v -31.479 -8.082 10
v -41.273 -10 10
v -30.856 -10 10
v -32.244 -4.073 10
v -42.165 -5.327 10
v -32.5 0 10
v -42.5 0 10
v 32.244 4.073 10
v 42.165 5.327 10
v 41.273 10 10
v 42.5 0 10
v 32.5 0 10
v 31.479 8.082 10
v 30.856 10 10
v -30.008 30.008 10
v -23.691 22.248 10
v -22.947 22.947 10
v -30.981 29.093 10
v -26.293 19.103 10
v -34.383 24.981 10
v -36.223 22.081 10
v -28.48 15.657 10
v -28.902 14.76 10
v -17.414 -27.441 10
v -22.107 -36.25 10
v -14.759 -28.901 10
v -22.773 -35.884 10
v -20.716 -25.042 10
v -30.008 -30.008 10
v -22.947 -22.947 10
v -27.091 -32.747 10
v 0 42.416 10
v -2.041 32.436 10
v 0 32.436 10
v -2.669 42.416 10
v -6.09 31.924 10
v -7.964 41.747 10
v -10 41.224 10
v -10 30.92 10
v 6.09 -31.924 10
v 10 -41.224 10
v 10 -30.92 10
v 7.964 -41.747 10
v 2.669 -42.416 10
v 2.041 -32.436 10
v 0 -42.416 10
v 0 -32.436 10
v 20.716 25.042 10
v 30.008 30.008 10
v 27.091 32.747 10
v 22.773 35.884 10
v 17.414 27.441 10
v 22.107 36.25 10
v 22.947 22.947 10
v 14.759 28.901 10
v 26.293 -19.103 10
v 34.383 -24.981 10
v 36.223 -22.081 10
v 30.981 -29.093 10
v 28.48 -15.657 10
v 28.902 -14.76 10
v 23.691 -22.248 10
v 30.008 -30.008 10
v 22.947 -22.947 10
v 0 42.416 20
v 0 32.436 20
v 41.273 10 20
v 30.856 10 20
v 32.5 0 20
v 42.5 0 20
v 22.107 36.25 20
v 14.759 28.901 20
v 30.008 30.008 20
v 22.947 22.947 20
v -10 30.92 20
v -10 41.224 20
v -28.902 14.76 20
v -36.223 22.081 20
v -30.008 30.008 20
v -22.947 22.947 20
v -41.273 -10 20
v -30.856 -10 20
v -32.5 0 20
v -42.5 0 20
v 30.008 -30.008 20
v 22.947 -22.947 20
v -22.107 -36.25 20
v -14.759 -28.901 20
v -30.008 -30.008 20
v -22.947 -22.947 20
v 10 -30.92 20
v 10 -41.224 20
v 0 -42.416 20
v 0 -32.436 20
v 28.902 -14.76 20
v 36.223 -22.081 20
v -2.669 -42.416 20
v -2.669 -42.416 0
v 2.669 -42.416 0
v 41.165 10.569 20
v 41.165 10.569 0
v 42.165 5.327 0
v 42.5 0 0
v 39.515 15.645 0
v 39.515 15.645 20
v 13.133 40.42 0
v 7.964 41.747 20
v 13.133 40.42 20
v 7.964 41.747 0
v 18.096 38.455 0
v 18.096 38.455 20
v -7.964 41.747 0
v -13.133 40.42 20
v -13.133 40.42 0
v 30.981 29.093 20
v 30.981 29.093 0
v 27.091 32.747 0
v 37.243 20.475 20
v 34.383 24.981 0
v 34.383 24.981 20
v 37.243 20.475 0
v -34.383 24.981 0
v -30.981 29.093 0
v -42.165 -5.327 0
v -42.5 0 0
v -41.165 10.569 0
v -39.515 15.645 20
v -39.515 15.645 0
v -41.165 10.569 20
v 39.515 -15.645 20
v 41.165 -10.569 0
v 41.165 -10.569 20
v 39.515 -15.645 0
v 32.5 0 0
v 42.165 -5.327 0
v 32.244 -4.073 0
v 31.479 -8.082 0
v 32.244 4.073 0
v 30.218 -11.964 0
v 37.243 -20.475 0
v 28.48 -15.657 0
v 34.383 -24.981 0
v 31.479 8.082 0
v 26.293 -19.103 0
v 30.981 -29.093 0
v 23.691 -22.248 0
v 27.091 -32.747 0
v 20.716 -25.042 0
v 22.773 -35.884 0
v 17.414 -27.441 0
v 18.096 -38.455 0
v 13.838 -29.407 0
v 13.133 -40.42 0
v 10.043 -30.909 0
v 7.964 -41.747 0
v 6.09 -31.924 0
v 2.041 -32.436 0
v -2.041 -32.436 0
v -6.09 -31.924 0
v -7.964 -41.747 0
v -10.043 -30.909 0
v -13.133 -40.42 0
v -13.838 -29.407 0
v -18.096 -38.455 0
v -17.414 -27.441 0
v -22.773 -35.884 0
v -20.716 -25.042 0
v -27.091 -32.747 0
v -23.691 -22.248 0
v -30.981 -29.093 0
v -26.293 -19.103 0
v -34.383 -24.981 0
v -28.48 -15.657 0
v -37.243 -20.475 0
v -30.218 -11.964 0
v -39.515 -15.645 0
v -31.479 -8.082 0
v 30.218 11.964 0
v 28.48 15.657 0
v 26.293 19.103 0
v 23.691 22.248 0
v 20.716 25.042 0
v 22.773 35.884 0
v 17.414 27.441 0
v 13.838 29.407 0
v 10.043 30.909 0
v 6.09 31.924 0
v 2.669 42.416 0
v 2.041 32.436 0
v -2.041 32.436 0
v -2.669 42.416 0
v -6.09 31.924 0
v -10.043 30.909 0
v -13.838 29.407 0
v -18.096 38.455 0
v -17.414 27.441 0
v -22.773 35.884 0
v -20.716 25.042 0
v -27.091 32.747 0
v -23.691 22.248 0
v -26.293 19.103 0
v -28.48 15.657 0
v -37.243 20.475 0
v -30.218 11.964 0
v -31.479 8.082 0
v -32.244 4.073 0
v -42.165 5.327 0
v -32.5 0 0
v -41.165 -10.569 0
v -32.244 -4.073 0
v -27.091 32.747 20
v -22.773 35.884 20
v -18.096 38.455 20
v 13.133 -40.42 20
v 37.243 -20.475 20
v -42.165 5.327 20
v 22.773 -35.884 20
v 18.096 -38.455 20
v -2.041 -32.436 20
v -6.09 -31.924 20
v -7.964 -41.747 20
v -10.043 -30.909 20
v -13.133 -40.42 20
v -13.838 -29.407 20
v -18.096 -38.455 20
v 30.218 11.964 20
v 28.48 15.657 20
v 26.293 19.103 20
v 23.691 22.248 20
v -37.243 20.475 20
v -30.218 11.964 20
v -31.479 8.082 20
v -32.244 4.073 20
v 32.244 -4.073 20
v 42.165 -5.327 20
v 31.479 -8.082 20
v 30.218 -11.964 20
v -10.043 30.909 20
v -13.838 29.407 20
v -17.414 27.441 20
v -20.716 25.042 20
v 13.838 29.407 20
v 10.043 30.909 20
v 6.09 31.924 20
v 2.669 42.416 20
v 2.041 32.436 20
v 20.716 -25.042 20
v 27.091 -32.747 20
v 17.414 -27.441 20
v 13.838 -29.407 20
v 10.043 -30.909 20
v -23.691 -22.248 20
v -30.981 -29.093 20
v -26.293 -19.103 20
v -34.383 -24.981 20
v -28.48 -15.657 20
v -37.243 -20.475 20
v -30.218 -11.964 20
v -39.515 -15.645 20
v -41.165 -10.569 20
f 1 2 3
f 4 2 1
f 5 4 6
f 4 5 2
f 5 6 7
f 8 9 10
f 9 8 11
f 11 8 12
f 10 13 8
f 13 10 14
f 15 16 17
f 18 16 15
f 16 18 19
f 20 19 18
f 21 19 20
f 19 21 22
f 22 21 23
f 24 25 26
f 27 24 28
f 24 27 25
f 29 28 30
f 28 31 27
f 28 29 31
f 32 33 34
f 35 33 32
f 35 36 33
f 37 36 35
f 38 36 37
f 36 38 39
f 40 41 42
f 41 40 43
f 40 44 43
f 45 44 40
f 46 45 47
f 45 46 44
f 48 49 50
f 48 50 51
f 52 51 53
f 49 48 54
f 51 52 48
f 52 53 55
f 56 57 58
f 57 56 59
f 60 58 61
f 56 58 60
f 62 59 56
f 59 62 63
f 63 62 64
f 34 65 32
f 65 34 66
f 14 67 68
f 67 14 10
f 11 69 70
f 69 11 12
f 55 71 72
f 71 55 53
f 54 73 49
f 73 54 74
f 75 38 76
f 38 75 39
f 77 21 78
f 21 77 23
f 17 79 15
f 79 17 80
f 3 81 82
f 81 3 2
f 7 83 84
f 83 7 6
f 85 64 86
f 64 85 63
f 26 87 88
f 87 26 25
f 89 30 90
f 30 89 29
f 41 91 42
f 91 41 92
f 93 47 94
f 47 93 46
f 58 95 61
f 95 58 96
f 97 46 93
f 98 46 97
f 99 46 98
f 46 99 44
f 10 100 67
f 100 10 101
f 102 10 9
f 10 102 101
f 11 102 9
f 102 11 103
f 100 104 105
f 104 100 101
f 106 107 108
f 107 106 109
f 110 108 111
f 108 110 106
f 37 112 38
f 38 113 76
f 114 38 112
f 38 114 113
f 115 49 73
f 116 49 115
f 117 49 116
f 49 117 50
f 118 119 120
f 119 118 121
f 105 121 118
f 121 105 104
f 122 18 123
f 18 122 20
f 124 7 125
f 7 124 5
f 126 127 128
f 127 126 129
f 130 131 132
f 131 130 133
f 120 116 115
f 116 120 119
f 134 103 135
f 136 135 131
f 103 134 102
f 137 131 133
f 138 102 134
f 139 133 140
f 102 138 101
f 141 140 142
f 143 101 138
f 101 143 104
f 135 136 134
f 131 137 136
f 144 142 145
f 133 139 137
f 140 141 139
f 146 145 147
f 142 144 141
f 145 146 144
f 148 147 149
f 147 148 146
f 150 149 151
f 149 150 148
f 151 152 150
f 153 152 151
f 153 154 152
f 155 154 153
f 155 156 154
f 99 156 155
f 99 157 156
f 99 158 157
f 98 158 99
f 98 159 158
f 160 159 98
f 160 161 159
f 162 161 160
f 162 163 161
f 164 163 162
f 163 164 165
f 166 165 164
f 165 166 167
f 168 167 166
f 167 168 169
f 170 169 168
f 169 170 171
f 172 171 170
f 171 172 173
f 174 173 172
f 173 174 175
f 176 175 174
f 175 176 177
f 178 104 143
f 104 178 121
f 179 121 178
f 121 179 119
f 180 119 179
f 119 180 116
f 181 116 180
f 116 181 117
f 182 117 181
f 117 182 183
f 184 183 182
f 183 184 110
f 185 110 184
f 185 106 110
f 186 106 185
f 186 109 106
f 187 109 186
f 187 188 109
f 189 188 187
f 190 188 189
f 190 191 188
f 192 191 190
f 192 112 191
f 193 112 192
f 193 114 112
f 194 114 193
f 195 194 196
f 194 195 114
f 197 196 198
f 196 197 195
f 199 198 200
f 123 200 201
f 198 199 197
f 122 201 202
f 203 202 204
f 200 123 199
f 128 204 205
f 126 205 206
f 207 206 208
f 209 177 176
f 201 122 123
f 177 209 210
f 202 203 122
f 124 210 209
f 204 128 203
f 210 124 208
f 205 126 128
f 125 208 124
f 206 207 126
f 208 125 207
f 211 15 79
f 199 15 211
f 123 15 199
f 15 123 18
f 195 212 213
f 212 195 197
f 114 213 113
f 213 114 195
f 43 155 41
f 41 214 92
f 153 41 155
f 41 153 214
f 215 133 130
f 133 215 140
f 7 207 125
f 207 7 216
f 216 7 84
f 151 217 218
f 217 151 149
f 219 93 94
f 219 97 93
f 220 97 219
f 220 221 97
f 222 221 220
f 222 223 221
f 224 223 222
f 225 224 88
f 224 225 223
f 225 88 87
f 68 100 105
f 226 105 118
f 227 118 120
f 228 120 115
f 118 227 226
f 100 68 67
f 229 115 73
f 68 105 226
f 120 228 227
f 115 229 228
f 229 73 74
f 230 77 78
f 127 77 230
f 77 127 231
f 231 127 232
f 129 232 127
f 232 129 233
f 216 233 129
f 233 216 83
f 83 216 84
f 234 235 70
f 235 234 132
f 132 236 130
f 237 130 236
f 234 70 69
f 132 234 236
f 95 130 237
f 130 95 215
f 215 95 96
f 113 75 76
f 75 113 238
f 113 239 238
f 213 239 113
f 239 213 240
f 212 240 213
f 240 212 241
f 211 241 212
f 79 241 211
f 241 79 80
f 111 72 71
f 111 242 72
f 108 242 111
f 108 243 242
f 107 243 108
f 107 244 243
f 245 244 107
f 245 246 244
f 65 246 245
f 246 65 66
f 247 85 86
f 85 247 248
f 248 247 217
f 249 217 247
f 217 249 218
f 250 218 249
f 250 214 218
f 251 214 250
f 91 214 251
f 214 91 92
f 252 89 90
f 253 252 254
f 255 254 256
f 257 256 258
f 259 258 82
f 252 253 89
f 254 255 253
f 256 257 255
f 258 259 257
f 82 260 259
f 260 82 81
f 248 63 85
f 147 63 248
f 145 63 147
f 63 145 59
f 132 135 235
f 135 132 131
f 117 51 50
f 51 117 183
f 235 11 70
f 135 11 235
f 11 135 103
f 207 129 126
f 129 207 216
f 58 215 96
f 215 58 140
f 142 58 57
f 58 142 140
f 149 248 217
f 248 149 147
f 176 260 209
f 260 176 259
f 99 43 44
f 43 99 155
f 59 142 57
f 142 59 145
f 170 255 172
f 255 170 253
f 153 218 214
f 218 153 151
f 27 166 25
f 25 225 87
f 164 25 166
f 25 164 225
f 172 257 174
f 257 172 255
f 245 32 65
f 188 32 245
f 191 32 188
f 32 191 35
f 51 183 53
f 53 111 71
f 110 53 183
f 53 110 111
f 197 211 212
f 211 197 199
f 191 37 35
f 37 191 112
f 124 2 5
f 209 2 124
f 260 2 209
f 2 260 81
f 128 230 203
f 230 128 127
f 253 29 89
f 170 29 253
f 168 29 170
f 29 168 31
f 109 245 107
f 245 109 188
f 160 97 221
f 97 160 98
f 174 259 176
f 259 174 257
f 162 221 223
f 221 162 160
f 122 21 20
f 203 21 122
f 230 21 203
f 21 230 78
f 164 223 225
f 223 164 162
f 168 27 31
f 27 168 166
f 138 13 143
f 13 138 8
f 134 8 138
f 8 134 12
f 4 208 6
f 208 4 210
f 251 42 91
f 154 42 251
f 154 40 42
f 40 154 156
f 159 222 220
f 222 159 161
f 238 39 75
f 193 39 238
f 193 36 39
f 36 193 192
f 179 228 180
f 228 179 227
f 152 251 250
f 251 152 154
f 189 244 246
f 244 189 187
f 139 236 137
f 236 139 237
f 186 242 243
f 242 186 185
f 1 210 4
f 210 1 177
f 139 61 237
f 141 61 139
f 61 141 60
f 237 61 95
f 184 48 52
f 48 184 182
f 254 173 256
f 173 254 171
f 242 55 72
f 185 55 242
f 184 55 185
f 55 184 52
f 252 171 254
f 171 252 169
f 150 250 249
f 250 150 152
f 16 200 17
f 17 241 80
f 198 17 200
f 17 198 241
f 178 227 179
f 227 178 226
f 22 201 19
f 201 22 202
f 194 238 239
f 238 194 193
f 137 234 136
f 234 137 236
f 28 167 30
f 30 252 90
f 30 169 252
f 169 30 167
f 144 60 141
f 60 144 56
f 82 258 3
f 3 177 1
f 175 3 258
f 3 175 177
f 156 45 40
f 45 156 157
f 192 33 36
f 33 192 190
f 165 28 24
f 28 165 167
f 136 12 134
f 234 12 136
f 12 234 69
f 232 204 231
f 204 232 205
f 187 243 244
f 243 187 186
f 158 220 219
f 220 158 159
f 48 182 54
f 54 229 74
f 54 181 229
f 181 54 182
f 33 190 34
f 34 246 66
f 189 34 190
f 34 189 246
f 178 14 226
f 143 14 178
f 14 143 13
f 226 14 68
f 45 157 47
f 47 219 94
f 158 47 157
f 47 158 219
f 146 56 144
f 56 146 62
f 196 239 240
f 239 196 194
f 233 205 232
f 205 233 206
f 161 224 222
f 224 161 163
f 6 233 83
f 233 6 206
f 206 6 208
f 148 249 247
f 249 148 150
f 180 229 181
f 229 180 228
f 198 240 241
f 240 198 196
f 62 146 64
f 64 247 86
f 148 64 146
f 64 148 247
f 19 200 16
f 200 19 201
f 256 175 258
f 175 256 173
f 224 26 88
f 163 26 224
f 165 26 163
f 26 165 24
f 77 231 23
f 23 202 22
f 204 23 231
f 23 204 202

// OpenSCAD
//Adapter für hohe Orchideentöpfe
//height adjuster for orchid plant pots
//20180603 P. de Graaff

$fn=50;
Durchmesser=85; //outer diameter of adjuster
Hoehe=20;       //height of adjuster
difference(){
    cylinder(d=Durchmesser,h=Hoehe);
    cylinder(d=Durchmesser-20,h=Hoehe+1);
    translate([0,0,10])for (i =[0:8]){
        rotate([0,0,i*45])cube([50,10,50]);
    }
}
